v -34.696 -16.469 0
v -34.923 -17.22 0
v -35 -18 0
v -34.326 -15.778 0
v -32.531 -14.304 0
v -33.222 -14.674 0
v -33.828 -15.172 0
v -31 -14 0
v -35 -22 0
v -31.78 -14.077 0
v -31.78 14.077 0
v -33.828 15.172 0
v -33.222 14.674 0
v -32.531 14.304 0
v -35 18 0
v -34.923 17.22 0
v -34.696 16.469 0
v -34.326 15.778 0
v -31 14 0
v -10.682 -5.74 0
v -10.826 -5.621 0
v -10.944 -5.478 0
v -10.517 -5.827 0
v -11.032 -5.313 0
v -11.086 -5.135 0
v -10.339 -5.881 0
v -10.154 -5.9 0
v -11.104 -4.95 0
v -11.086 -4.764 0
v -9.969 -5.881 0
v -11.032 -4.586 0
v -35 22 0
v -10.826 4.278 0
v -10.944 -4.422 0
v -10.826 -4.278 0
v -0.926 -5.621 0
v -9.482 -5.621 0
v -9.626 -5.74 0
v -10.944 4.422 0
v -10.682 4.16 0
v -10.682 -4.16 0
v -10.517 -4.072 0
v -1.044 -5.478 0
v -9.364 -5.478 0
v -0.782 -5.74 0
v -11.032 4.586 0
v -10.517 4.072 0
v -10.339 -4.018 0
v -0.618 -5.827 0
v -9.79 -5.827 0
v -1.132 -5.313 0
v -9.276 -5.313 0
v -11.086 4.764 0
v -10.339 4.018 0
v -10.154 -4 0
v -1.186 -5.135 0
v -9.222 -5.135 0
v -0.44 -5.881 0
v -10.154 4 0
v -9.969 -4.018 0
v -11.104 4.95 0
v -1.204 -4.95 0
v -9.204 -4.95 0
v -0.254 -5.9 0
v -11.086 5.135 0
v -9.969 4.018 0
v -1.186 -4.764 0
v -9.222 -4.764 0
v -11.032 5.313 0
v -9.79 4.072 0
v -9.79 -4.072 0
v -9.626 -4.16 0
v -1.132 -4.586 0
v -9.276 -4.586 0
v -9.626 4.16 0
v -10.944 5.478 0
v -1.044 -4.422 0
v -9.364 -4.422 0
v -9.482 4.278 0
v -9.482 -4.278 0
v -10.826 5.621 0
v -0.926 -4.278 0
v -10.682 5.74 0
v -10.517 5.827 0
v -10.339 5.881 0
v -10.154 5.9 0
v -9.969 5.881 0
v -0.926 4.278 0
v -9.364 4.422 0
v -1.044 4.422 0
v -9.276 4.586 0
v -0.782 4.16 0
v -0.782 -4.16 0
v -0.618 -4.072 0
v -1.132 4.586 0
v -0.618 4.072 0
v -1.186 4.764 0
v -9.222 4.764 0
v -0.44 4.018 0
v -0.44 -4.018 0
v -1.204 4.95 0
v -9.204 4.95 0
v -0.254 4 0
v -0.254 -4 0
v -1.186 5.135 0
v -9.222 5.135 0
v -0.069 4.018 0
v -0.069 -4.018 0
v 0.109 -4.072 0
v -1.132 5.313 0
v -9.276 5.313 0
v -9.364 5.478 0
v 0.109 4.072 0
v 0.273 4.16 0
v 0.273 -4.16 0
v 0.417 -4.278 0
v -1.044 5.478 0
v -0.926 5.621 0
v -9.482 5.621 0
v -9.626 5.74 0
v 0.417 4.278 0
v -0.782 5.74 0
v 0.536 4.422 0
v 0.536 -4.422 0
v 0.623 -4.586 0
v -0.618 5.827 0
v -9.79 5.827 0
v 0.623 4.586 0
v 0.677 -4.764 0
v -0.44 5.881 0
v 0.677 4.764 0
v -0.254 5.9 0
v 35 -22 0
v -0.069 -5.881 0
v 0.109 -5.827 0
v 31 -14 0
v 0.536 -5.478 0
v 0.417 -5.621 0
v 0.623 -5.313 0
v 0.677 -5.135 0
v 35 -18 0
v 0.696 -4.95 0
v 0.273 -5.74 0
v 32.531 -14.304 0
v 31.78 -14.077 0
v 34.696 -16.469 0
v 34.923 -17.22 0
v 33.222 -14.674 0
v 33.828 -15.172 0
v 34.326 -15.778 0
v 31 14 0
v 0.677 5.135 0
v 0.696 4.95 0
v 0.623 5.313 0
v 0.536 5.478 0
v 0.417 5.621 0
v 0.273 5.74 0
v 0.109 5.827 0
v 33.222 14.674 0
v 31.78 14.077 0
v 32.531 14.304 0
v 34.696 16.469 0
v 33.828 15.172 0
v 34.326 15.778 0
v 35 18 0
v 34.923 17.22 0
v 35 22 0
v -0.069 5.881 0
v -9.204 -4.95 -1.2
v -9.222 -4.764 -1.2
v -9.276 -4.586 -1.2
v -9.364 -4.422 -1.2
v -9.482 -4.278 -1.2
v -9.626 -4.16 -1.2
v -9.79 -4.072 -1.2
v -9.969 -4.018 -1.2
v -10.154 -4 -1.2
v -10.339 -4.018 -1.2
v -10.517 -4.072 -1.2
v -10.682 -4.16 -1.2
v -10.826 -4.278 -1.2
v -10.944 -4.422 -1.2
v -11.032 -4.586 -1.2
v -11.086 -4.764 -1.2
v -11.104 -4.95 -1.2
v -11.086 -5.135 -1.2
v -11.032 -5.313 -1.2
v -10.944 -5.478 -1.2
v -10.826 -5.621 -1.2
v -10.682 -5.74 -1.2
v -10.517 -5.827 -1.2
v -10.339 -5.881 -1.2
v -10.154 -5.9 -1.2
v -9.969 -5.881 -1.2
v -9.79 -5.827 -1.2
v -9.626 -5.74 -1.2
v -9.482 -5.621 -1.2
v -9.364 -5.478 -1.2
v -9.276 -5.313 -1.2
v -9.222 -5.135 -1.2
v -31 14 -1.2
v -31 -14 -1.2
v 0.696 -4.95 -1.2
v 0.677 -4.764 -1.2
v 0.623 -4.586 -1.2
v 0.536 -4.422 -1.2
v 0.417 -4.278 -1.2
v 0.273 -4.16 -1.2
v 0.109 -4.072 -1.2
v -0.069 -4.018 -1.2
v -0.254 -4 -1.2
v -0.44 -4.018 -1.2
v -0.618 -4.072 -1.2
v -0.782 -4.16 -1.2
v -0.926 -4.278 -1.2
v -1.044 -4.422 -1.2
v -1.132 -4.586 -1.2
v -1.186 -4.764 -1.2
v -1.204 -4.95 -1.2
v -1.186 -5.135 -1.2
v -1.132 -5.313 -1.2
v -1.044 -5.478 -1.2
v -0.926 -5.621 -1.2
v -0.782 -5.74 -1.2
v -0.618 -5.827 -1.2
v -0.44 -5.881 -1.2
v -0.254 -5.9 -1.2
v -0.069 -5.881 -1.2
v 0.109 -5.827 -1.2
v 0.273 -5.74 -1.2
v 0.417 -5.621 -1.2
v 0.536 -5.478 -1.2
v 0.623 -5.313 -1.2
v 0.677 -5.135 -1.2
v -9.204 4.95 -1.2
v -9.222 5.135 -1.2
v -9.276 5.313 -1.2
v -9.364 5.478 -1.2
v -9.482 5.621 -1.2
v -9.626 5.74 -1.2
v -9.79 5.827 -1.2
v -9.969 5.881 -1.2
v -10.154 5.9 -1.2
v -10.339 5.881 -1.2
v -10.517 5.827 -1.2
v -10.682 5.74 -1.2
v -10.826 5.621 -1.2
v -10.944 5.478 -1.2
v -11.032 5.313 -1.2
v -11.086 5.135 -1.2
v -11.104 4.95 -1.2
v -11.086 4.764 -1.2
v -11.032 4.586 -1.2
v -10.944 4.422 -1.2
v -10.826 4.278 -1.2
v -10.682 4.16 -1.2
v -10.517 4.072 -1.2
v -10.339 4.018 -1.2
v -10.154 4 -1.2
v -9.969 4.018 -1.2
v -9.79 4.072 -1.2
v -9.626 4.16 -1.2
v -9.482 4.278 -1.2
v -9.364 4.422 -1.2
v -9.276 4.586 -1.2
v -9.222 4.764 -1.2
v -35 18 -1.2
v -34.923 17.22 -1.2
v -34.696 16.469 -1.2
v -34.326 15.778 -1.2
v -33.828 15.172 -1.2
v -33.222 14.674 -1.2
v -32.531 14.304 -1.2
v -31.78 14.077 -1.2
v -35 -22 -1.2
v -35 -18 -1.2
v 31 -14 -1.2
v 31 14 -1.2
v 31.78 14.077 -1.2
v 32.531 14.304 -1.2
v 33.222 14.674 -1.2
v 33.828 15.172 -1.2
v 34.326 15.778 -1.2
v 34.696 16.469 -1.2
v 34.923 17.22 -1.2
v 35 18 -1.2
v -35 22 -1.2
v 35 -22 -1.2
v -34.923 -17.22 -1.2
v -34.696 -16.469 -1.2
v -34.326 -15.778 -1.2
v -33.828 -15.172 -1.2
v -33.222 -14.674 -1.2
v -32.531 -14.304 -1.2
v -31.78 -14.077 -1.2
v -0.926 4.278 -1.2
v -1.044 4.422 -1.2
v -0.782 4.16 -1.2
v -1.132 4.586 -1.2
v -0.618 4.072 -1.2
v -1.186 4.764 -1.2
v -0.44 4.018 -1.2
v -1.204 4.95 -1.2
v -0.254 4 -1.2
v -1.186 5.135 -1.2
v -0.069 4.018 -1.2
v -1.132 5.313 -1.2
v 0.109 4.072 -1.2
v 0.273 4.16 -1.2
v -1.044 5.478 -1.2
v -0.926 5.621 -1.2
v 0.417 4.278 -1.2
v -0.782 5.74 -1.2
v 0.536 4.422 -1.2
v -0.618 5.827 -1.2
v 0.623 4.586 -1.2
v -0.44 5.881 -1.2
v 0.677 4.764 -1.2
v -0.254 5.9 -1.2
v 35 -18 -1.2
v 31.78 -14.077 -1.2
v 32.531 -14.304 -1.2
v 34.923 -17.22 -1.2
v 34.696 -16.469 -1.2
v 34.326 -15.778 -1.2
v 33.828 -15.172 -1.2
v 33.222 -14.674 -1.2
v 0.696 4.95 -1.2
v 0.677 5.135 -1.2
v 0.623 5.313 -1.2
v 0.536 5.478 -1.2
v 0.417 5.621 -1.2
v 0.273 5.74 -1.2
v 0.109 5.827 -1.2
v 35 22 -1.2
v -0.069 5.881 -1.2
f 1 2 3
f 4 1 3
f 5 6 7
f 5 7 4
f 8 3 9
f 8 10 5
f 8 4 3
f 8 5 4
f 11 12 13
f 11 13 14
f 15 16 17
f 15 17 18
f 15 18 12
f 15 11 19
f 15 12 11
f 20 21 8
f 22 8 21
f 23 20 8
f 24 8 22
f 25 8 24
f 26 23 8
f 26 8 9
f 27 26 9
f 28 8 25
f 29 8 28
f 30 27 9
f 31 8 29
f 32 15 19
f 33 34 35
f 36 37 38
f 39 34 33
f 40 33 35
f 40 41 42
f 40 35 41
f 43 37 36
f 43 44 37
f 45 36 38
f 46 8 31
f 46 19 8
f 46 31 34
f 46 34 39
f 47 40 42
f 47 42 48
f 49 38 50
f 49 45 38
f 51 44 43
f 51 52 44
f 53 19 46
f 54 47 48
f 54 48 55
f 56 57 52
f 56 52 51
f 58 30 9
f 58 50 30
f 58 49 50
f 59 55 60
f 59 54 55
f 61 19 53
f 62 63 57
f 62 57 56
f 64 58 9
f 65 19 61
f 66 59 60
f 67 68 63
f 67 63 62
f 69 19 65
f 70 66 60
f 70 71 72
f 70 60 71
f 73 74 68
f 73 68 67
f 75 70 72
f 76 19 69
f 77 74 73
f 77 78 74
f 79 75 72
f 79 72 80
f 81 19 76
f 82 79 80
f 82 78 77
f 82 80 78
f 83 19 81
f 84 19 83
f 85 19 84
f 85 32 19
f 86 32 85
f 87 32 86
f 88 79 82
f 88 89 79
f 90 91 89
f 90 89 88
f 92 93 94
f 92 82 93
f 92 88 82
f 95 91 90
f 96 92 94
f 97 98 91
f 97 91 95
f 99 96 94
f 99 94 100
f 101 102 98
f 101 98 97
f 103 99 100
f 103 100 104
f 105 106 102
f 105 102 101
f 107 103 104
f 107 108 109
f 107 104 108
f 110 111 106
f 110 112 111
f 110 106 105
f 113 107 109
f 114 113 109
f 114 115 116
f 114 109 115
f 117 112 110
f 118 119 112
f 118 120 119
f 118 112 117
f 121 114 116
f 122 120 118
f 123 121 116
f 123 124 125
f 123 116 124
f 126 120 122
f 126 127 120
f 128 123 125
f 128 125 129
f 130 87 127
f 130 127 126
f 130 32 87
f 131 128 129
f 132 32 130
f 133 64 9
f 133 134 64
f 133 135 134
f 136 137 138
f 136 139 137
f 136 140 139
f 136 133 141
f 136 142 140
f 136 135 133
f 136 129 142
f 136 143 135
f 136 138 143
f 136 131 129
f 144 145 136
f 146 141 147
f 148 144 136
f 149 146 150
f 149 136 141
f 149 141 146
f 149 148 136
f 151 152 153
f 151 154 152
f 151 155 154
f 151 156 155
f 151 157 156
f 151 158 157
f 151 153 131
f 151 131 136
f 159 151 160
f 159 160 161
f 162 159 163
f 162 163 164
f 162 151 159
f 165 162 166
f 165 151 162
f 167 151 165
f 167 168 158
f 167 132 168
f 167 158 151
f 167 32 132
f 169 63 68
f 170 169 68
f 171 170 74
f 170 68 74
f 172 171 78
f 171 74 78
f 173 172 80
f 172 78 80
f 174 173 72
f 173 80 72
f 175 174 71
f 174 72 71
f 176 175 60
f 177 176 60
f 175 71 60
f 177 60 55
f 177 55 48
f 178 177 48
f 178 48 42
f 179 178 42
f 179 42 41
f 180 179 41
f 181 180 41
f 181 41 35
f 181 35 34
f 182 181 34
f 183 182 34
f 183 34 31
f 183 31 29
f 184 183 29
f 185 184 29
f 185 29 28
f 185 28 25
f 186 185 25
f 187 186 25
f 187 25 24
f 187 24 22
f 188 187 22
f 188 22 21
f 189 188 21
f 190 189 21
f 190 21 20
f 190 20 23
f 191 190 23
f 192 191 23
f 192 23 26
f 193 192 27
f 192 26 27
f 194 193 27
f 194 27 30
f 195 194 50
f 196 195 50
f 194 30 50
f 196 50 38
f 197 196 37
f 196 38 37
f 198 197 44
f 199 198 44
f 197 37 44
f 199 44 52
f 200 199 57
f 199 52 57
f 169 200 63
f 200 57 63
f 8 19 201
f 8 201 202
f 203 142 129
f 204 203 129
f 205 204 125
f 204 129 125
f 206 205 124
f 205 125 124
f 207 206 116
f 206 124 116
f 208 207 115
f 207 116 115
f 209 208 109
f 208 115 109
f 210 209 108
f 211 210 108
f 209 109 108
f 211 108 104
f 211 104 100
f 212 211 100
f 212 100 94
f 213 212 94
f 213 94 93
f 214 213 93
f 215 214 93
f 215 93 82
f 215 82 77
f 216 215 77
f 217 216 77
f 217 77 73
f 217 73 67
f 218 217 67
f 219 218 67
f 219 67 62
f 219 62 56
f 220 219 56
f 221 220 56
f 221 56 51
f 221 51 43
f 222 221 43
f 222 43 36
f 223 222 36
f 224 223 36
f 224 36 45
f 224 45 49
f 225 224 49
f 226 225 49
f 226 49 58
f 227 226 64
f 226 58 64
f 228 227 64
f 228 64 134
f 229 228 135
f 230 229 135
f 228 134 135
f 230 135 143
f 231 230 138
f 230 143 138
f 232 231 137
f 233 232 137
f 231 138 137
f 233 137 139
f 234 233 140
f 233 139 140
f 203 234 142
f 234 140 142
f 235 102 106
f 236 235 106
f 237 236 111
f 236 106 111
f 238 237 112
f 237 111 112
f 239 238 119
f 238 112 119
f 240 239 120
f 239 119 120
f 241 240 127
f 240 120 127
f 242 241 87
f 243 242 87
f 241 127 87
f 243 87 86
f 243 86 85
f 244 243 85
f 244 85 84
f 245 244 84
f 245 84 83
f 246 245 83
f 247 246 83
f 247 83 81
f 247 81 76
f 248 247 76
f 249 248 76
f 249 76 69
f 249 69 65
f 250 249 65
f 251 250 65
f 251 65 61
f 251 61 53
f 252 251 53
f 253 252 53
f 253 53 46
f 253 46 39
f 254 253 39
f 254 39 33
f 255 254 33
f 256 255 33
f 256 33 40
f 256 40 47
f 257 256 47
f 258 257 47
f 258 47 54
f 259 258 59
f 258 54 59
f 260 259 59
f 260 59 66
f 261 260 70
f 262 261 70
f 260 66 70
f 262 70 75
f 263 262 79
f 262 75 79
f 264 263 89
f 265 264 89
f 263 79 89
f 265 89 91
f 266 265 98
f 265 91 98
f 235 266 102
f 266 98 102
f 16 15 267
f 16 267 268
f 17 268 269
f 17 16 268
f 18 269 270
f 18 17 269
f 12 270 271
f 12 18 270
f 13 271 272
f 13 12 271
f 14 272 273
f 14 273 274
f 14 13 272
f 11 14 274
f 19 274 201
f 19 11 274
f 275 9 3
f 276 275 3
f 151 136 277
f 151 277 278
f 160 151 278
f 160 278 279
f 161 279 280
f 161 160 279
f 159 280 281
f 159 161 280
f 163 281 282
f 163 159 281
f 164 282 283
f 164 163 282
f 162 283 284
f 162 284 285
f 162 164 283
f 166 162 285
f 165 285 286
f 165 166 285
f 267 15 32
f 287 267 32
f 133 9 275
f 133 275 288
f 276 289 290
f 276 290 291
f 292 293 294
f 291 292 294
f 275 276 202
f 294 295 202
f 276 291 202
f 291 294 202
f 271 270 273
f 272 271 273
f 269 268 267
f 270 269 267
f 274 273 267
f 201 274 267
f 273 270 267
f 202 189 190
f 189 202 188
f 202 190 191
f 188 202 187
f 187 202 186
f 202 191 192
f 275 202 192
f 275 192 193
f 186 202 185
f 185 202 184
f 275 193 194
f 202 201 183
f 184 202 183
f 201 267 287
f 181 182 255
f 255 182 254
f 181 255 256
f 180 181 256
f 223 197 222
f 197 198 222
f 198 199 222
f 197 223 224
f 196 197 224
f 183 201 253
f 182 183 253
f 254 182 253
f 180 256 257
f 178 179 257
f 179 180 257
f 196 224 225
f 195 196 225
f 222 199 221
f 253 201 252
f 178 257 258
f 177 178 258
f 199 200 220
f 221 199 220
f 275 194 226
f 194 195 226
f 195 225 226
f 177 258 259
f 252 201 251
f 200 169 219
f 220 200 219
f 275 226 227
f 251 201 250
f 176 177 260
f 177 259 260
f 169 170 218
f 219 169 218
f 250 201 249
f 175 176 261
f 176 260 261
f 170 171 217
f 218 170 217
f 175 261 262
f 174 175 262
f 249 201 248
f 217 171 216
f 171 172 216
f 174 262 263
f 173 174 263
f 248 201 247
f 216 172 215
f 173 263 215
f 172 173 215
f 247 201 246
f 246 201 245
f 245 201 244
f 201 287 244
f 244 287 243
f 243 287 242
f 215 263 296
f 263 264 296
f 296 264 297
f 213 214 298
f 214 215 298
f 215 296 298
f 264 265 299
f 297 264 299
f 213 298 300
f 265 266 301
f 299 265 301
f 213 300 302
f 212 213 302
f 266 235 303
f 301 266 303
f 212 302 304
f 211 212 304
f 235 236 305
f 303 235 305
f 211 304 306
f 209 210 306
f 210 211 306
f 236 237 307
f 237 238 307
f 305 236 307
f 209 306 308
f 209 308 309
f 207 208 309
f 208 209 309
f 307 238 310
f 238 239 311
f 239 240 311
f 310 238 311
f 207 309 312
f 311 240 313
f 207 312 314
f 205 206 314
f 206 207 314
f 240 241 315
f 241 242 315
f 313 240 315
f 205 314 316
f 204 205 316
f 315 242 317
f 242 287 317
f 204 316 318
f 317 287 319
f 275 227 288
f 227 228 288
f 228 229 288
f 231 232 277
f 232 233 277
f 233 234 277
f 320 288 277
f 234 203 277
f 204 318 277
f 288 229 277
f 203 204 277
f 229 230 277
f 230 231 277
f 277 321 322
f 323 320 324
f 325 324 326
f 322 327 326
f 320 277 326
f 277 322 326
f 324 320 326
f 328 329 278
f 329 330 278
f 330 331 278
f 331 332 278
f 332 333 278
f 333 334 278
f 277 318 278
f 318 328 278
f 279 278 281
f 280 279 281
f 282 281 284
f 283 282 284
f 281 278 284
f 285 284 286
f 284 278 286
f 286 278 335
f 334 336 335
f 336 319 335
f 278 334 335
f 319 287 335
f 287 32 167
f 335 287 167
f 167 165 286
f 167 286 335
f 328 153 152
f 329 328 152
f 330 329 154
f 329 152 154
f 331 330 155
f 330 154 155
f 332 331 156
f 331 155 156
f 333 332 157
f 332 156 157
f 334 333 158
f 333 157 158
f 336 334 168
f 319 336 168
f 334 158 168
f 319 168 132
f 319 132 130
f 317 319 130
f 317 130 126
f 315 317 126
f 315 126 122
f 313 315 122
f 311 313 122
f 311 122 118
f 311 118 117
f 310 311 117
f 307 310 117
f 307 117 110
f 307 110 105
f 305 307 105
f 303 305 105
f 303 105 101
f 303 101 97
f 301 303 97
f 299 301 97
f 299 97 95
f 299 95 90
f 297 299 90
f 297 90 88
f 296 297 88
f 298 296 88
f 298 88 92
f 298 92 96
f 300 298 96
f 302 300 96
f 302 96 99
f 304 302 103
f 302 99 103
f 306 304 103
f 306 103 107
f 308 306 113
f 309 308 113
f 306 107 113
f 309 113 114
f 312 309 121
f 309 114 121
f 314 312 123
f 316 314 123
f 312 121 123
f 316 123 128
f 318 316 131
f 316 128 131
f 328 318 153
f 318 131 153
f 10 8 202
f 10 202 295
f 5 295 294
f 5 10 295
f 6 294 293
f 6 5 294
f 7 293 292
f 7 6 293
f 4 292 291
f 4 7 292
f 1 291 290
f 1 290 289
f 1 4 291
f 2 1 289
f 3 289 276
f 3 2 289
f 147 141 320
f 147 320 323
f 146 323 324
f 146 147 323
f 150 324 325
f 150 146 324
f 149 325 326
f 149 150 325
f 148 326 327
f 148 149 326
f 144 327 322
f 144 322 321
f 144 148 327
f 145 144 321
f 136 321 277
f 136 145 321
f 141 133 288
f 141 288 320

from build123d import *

# Parameters (mm, degrees)
SKETCH_2_W             = 70
SKETCH_2_H             = 44
SM_BASE_FLANGE_1_DEPTH = 1.2
CUT_EXTRUDE_1_DEPTH    = 42.357466073
SKETCH_6_R             = 0.95
CUT_EXTRUDE_2_DEPTH    = 42.357466073


# Sheet-metal steps are written as plain solids
with BuildPart() as part:
    # 草图2 → 基体-法兰1 (new body)
    with BuildSketch(Plane.XY):
        Rectangle(SKETCH_2_W, SKETCH_2_H)
    extrude(amount=-SM_BASE_FLANGE_1_DEPTH)

    # 草图5 → 切除-拉伸1 (cut, through all)
    with BuildSketch(Plane.XY):
        with BuildLine():
            Line((39, -14), (35, -14))
            Line((35, -14), (35, -18))
            ThreePointArc((35, -18), (33.828427125, -15.171572875), (31, -14))
            Line((31, -14), (31, 14))
            ThreePointArc((31, 14), (33.828427125, 15.171572875), (35, 18))
            Line((35, 18), (35, 14))
            Line((35, 14), (39, 14))
            Line((39, 14), (39, -14))
        make_face()
        with BuildLine():
            Line((-39, -14), (-39, 14))
            Line((-39, 14), (-35, 14))
            Line((-35, 14), (-35, 18))
            ThreePointArc((-35, 18), (-33.828427125, 15.171572875), (-31, 14))
            Line((-31, 14), (-31, -14))
            ThreePointArc((-31, -14), (-33.828427125, -15.171572875), (-35, -18))
            Line((-35, -18), (-35, -14))
            Line((-35, -14), (-39, -14))
        make_face()
    extrude(amount=-CUT_EXTRUDE_1_DEPTH, mode=Mode.SUBTRACT)

    # 草图6 → 切除-拉伸2 (cut, through all)
    with BuildSketch(Plane.XY):
        with Locations((-10.153838394, 4.949747468)):
            Circle(SKETCH_6_R)
        with Locations((-0.254343457, 4.949747468)):
            Circle(SKETCH_6_R)
        with Locations((-0.254343457, -4.949747468)):
            Circle(SKETCH_6_R)
        with Locations((-10.153838394, -4.949747468)):
            Circle(SKETCH_6_R)
    extrude(amount=-CUT_EXTRUDE_2_DEPTH, mode=Mode.SUBTRACT)


solid = part.part
